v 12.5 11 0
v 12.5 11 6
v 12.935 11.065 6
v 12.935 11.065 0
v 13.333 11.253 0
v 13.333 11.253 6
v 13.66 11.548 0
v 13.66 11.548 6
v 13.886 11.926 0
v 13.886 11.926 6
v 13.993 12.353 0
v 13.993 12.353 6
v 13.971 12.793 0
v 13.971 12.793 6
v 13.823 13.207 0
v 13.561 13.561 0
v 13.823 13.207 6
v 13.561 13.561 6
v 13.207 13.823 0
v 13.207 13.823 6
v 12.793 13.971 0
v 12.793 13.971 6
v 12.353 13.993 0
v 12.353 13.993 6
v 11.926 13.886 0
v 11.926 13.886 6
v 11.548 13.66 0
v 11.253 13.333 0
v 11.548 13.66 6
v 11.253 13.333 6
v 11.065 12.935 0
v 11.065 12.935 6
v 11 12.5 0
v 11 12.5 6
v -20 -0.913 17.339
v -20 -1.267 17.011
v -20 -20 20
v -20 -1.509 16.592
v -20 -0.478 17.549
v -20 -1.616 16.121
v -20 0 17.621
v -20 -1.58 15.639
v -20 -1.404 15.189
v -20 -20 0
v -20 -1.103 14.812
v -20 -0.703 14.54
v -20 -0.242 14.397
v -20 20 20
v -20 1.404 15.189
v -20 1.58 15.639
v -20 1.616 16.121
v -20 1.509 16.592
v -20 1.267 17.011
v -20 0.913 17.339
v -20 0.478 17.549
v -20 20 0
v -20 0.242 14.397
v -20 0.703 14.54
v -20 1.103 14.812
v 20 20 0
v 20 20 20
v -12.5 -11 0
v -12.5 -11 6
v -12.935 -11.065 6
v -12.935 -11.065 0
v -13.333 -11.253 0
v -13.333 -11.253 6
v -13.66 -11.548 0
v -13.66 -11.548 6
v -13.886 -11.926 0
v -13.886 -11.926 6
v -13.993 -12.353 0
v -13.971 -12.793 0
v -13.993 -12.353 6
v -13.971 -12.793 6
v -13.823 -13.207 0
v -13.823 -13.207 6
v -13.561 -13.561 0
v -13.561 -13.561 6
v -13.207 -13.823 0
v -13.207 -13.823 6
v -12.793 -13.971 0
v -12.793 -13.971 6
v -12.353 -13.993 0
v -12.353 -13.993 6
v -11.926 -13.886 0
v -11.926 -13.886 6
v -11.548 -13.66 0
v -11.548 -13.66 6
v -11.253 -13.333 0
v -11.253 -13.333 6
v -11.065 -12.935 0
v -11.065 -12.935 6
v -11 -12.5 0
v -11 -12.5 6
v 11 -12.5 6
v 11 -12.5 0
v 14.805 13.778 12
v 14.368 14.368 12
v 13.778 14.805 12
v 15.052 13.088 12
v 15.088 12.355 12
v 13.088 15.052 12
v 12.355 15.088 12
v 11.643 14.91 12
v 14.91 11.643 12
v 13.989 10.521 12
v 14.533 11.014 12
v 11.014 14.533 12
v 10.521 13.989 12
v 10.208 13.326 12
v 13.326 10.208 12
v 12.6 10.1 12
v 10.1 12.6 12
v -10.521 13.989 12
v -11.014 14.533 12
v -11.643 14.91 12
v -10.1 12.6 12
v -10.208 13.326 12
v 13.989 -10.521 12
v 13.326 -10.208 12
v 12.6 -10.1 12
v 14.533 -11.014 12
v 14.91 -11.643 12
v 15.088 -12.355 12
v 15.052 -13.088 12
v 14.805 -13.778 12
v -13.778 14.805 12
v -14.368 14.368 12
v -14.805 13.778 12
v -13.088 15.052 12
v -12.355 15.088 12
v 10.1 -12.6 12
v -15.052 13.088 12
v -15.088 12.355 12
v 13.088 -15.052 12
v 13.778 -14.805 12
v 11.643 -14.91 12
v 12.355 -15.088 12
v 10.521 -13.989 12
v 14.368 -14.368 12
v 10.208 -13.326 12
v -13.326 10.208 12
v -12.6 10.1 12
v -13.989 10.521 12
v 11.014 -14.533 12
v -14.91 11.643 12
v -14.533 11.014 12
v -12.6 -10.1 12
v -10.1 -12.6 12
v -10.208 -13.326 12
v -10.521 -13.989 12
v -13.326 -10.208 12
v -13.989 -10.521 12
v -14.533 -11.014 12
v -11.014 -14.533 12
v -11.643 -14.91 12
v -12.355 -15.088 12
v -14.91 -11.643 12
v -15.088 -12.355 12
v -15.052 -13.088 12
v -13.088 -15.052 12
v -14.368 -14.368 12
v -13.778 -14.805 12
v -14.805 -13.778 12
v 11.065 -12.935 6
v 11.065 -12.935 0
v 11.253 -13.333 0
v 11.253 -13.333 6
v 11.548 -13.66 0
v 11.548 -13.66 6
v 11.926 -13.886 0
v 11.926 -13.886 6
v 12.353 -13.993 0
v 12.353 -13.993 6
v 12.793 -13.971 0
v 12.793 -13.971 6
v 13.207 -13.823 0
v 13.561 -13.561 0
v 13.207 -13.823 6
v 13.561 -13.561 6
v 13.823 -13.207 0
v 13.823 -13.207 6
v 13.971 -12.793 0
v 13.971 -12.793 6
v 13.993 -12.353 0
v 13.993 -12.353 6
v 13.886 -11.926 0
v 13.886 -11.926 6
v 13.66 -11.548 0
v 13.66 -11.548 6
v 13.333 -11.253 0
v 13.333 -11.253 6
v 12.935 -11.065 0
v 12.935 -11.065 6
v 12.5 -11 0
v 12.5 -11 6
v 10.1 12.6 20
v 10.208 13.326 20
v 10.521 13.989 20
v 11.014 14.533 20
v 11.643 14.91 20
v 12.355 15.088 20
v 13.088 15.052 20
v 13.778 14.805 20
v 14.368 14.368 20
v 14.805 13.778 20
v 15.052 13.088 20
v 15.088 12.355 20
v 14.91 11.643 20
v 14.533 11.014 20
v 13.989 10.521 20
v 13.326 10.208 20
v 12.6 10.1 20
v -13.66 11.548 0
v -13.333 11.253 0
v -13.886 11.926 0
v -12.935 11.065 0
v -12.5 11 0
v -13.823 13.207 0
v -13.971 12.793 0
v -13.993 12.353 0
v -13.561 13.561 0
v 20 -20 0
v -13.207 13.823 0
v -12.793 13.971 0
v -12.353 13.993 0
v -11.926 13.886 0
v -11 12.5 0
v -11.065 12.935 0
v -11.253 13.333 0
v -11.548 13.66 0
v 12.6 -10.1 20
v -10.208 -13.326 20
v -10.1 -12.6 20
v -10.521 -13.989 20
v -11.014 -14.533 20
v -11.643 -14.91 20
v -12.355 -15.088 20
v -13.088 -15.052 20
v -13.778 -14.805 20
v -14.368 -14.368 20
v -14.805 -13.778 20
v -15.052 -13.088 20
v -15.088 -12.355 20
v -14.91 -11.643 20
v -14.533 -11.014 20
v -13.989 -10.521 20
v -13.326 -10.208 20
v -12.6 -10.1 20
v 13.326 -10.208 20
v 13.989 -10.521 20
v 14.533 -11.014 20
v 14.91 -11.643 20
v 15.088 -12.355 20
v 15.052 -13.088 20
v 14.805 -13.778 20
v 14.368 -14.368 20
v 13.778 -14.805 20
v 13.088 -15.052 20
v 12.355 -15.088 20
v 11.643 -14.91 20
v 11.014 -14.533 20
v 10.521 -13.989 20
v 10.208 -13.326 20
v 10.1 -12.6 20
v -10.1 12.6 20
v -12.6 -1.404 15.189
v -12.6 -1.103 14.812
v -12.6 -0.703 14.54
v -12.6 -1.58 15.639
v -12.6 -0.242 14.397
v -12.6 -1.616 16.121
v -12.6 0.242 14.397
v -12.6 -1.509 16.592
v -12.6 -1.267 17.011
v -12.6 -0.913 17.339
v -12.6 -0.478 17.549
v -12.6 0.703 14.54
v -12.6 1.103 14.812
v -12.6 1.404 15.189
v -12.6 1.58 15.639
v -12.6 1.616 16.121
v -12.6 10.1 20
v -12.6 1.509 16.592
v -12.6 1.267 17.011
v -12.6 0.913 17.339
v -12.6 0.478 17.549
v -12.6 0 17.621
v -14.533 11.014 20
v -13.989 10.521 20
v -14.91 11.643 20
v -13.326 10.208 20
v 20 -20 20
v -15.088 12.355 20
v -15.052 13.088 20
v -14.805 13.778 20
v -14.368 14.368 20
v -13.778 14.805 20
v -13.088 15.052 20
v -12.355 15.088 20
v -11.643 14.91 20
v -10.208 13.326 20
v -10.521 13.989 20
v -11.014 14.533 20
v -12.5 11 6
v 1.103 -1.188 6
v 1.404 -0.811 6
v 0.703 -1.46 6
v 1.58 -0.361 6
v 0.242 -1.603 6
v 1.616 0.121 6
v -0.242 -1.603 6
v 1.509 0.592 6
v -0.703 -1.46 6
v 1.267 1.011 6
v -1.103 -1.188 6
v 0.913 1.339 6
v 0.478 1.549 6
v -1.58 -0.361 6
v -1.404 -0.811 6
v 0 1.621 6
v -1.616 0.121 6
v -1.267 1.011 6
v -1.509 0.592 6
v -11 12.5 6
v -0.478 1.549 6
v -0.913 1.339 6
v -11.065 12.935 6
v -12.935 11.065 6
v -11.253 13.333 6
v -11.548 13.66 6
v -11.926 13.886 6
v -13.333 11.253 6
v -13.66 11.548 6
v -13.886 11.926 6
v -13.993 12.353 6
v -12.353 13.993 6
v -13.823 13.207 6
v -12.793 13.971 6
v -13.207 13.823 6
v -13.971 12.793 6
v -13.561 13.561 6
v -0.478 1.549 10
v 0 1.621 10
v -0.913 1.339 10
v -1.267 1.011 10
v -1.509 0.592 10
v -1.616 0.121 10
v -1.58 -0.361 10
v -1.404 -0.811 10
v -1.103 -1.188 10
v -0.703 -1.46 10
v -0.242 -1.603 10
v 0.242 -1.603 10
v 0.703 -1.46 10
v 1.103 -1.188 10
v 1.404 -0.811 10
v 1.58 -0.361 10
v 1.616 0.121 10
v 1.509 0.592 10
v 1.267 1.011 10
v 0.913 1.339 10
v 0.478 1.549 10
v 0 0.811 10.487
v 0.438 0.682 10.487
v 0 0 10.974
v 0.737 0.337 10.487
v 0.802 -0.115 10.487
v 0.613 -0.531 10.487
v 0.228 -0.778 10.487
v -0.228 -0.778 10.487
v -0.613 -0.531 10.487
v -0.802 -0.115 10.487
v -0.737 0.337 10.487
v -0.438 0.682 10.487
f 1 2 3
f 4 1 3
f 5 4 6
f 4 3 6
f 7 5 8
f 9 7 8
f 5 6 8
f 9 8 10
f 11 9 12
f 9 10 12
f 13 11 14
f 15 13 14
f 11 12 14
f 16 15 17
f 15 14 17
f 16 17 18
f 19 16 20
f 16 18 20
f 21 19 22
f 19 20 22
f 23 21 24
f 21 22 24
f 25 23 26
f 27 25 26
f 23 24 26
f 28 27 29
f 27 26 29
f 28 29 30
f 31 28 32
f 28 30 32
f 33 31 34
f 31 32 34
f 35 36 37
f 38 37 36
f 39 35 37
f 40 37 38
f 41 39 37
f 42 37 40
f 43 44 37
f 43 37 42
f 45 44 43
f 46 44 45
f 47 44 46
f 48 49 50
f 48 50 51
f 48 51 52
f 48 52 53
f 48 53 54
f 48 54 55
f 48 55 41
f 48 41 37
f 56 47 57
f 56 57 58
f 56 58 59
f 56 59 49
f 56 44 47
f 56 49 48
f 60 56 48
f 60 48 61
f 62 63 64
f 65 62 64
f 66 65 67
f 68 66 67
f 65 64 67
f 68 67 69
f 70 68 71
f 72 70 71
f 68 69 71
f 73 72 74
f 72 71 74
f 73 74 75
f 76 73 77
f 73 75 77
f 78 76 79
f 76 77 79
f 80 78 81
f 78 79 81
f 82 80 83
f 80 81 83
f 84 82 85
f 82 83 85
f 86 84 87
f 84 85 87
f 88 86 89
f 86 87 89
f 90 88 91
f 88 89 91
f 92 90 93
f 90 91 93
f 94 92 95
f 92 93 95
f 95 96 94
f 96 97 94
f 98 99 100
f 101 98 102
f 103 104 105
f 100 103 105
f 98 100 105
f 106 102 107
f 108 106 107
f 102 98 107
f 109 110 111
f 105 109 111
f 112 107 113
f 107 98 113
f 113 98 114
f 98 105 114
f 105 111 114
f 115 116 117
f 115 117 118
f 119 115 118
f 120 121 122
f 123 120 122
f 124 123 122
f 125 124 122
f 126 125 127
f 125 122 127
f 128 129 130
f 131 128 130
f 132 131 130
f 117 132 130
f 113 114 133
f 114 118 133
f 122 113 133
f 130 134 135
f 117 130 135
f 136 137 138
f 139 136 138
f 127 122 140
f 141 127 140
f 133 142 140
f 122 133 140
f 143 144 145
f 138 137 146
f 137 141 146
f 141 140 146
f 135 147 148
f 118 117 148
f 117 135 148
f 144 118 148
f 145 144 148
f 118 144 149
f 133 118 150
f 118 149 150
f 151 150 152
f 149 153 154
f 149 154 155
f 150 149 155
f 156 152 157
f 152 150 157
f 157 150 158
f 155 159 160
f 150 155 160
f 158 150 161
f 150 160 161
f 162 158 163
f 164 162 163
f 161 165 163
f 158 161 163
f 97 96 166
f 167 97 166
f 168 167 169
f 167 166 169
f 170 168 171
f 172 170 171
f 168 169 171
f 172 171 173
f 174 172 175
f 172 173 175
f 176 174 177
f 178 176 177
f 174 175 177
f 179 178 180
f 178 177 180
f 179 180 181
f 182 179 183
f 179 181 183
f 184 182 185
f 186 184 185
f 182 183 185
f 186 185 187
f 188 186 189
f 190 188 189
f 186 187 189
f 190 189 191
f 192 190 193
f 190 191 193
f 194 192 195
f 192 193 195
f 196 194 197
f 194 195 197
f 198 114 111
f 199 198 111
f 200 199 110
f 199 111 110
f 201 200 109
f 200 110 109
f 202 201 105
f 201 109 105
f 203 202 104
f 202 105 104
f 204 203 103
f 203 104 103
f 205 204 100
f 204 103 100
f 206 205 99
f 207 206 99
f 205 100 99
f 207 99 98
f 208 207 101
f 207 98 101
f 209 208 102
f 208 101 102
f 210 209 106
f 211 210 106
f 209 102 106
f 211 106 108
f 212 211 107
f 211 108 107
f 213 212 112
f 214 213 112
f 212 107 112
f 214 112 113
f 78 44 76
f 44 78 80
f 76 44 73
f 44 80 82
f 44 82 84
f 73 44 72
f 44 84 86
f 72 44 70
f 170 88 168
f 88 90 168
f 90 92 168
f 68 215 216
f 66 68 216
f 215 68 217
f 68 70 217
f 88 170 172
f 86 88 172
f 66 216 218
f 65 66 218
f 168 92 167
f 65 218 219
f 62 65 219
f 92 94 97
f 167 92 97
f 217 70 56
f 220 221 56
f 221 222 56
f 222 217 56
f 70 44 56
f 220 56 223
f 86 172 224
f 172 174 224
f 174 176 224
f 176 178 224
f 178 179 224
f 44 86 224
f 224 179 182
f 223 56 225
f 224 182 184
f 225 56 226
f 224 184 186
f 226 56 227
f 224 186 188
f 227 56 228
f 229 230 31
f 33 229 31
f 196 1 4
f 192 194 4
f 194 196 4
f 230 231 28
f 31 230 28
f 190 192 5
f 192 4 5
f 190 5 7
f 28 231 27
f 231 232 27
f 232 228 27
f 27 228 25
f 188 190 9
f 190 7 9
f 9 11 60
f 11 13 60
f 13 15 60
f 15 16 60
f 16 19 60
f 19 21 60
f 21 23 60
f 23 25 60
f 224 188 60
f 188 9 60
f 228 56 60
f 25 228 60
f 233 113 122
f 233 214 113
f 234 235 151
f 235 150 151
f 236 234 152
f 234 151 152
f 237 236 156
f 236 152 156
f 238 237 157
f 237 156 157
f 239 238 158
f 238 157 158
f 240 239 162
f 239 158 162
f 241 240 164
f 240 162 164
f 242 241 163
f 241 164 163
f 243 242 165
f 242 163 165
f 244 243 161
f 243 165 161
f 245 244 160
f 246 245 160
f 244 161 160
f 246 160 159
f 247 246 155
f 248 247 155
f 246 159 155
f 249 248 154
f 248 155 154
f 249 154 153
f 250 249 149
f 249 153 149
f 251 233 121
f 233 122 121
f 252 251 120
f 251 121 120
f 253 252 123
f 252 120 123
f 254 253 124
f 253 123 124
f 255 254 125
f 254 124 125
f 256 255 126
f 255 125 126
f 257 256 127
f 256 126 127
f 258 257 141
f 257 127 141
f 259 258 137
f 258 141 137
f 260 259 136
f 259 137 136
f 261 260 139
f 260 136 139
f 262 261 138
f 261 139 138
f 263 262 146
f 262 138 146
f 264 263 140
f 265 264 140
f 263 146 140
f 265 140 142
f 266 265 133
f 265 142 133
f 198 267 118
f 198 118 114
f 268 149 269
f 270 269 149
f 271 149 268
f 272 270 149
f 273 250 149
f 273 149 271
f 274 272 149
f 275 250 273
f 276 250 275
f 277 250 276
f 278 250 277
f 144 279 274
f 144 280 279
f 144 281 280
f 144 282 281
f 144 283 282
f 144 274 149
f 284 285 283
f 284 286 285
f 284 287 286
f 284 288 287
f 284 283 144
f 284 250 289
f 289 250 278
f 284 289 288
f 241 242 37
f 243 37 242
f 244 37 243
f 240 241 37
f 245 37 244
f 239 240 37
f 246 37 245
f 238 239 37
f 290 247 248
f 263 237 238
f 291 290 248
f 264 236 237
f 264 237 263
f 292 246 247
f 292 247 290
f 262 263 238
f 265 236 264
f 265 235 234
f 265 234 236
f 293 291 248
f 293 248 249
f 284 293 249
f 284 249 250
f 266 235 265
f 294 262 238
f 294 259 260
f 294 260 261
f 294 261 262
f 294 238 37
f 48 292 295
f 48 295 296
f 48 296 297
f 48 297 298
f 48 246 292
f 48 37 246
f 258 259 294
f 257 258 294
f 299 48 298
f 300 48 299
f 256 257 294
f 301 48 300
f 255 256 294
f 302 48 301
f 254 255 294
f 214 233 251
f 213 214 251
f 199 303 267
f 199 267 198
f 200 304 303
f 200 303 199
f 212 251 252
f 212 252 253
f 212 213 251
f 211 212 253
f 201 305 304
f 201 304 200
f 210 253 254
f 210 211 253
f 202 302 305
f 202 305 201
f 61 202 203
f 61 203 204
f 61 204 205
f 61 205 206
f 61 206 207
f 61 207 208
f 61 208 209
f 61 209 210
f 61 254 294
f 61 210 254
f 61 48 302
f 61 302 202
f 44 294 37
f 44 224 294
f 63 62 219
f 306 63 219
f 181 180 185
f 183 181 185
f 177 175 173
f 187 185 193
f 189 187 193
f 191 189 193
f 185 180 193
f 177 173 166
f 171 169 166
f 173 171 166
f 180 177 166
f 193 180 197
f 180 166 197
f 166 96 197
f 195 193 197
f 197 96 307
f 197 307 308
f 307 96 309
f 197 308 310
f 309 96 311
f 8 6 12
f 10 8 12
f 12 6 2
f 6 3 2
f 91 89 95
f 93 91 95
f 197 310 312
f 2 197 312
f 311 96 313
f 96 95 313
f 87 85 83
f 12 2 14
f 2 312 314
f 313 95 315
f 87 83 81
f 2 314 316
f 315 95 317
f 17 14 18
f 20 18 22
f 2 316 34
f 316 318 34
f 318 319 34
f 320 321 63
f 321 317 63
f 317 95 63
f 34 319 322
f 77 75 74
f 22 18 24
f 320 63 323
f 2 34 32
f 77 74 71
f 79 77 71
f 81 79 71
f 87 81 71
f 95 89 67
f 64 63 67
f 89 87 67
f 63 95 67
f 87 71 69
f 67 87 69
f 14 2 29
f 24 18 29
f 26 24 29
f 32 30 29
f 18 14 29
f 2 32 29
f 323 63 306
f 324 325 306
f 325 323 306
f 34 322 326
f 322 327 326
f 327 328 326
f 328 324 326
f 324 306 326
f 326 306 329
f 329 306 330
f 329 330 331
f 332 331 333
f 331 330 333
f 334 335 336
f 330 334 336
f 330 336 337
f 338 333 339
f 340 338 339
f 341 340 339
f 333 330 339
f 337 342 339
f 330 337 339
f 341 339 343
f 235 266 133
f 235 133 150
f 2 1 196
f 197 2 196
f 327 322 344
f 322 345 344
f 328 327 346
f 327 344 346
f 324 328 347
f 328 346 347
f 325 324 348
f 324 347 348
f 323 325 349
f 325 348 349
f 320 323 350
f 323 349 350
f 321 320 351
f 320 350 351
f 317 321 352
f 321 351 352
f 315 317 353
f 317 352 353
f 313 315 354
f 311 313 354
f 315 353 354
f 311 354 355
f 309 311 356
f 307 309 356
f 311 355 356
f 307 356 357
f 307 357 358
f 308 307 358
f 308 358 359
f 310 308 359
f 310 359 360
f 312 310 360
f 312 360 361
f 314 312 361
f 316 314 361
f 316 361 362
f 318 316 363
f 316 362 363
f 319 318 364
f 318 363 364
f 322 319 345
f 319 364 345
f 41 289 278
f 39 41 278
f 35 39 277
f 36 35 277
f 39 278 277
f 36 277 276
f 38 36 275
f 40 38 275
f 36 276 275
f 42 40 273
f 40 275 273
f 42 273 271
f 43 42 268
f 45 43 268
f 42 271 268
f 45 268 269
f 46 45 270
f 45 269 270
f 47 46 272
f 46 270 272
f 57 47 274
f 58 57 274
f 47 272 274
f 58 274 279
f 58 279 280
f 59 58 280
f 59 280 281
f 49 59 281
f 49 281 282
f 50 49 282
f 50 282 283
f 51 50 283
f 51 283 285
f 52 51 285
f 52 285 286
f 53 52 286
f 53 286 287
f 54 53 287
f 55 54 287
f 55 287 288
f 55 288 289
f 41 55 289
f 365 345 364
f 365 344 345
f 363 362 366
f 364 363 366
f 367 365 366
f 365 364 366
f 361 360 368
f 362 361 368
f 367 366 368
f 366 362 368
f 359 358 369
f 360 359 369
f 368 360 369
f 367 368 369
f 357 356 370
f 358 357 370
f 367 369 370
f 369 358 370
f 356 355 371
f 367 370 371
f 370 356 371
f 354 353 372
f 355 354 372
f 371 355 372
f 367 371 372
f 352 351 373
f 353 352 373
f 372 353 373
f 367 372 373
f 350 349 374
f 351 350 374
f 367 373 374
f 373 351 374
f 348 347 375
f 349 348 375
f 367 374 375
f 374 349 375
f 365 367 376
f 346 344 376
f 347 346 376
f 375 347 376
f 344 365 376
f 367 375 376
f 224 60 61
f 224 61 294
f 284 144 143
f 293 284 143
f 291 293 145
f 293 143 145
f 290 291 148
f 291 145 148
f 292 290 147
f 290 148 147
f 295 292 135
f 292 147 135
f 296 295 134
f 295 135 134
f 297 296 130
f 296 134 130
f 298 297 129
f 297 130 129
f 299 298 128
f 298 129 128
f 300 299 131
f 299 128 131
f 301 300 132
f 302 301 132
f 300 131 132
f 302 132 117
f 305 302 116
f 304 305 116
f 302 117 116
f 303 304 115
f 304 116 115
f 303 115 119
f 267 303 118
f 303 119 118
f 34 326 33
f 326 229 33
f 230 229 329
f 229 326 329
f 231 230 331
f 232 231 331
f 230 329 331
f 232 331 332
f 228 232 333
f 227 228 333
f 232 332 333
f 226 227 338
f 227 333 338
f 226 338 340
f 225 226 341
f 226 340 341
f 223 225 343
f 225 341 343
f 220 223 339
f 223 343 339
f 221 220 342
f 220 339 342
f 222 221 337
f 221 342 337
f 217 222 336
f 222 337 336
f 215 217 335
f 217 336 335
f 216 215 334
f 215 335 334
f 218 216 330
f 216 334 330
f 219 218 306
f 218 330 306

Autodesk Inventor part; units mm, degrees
ref_plane "YZ Plane" through (0, 0, 0) normal (1, 0, 0) x (0, 1, 0)
ref_plane "XZ Plane" through (0, 0, 0) normal (0, 1, 0) x (-1, 0, 0)
ref_plane "XY Plane" through (0, 0, 0) normal (0, 0, 1) x (1, 0, 0)
sketch "Sketch1" plane through (0, 0, 0) normal (0, 0, 1) x (1, 0, 0)
  line L0 (0, 28) -> (0, -28) construction
  line L1 (-28, 0) -> (28, 0) construction
  line L2 (-20, 20) -> (20, 20)
  line L3 (20, 20) -> (20, -20)
  line L4 (20, -20) -> (-20, -20)
  line L5 (-20, -20) -> (-20, 20)
  point P0 (0, 0)
  dimension "d0" = 40
  dimension "d1" = 40
extrude "Extrusion1" add sketch "Sketch1" along normal blind 20
sketch "Sketch4" plane through (0, 0, 20) normal (0, 0, 1) x (1, 0, 0)
  line L0 (-28, 0) -> (28, 0) construction
  line L1 (0, 28) -> (0, -28) construction
  line L2 (-12.6, 12.6) -> (12.6, 12.6) construction
  line L3 (12.6, 12.6) -> (12.6, -12.6) construction
  line L4 (12.6, -12.6) -> (-12.6, -12.6) construction
  line L5 (-12.6, -12.6) -> (-12.6, 12.6) construction
  point P0 (0, 0)
  dimension "d15" = 25.2
  dimension "d16" = 25.2
hole "Hole2" at (-12.6, 12.6, 20) at (12.6, 12.6, 20) at (12.6, -12.6, 20) at (-12.6, -12.6, 20) at (-12.6, 12.6, 20) at (12.6, 12.6, 20) direction (0, 0, -1) diameter 5 depth 8
sketch "Sketch5" plane through (0, 0, 20) normal (0, 0, 1) x (1, 0, 0)
  circle A0 centre (-12.6, 12.6) radius 2.5 projected
  circle A1 centre (12.6, -12.6) radius 2.5 projected
  line L0 (-12.6, 12.6) -> (12.6, 12.6)
  line L1 (12.6, 12.6) -> (12.6, -12.6)
  line L2 (12.6, -12.6) -> (-12.6, -12.6)
  line L3 (-12.6, -12.6) -> (-12.6, 12.6)
  point P0 (0, 0)
extrude "Extrusion3" cut sketch "Sketch5" against normal blind 8 contours L0 L1 A1 L2 L3 A0 | A0 L3 L0 | L1 L2 A1 picked at (-10.9542, 12.4146) picked at (11.1977, -11.7189)
sketch "Sketch6" plane through (-20, -20, 0) normal (-1, 0, 0) x (0, 0, 1)
  line L0 (0, 40) -> (20, 40) projected
  line L1 (20, 9.9) -> (12, 9.9) construction
  line L2 (20, 30.1) -> (20, 9.9) construction
  line L3 (12, 30.1) -> (20, 30.1) construction
  line L4 (12, 9.9) -> (12, 30.1) construction
  line L5 (16, 30.1) -> (16, 9.9) construction
  point P0 (0, 20)
  point P1 (16, 20)
  dimension "d27" = 20
hole "Hole3" at (-20, 0, 16) direction (1, 0, 0) diameter 3.242 end up to surface thread size "M4x0.7" class "6H" standard "ANSI Metric M Profile"
sketch "Sketch8" plane through (0, 0, 0) normal (0, 0, -1) x (-1, 0, 0)
  line L0 (20, 20) -> (-20, 20) construction
  line L1 (-20, 20) -> (-20, -20) construction
  line L2 (-20, -20) -> (20, -20) construction
  line L3 (20, -20) -> (20, 20) construction
  line L4 (0, -31.5) -> (0, 31.5) construction
  line L5 (-28, 0) -> (28, 0) construction
  line L6 (-12.5, -12.5) -> (12.5, -12.5)
  line L7 (12.5, -12.5) -> (12.5, 12.5)
  line L8 (12.5, 12.5) -> (-12.5, 12.5)
  line L9 (-12.5, 12.5) -> (-12.5, -12.5)
  point P0 (0, 0)
  dimension "d44" = 25
  dimension "d45" = 25
extrude "Extrusion4" cut sketch "Sketch8" against normal blind 6
sketch "Sketch9" plane through (0, 0, 0) normal (0, 0, -1) x (-1, 0, 0)
  line L0 (12.5, 12.5) -> (12.5, -12.5) construction
  line L1 (12.5, -12.5) -> (-12.5, -12.5) construction
  line L2 (-12.5, -12.5) -> (-12.5, 12.5) construction
  line L3 (-12.5, 12.5) -> (12.5, 12.5) construction
  line L4 (20, 20) -> (-20, 20) construction
  line L5 (-20, 20) -> (-20, -20) construction
  line L6 (-20, -20) -> (20, -20) construction
  line L7 (20, -20) -> (20, 20) construction
  line L8 (12.5, -12.5) -> (-12.5, -12.5) construction
  point P0 (0, 0)
hole "Hole5" at (-12.5, 12.5, 0) at (-12.5, -12.5, 0) at (12.5, -12.5, 0) at (12.5, 12.5, 0) direction (0, 0, 1) diameter 3 depth 6
sketch "Sketch10" plane through (0, 0, 6) normal (0, 0, -1) x (-1, 0, 0)
  point P0 (0, 0)
  point P1 (0, 0)
hole "Hole6" at (0, 0, 6) direction (0, 0, 1) diameter 3.242 depth 4 tip angle 118 thread size "M4x0.7" class "6H" standard "ANSI Metric M Profile"
equation "\"d27\" = 0.5 * d0"
properties part number "Large-cuvette-mount-25mm-V3" material "PC/ABS Plastic"
